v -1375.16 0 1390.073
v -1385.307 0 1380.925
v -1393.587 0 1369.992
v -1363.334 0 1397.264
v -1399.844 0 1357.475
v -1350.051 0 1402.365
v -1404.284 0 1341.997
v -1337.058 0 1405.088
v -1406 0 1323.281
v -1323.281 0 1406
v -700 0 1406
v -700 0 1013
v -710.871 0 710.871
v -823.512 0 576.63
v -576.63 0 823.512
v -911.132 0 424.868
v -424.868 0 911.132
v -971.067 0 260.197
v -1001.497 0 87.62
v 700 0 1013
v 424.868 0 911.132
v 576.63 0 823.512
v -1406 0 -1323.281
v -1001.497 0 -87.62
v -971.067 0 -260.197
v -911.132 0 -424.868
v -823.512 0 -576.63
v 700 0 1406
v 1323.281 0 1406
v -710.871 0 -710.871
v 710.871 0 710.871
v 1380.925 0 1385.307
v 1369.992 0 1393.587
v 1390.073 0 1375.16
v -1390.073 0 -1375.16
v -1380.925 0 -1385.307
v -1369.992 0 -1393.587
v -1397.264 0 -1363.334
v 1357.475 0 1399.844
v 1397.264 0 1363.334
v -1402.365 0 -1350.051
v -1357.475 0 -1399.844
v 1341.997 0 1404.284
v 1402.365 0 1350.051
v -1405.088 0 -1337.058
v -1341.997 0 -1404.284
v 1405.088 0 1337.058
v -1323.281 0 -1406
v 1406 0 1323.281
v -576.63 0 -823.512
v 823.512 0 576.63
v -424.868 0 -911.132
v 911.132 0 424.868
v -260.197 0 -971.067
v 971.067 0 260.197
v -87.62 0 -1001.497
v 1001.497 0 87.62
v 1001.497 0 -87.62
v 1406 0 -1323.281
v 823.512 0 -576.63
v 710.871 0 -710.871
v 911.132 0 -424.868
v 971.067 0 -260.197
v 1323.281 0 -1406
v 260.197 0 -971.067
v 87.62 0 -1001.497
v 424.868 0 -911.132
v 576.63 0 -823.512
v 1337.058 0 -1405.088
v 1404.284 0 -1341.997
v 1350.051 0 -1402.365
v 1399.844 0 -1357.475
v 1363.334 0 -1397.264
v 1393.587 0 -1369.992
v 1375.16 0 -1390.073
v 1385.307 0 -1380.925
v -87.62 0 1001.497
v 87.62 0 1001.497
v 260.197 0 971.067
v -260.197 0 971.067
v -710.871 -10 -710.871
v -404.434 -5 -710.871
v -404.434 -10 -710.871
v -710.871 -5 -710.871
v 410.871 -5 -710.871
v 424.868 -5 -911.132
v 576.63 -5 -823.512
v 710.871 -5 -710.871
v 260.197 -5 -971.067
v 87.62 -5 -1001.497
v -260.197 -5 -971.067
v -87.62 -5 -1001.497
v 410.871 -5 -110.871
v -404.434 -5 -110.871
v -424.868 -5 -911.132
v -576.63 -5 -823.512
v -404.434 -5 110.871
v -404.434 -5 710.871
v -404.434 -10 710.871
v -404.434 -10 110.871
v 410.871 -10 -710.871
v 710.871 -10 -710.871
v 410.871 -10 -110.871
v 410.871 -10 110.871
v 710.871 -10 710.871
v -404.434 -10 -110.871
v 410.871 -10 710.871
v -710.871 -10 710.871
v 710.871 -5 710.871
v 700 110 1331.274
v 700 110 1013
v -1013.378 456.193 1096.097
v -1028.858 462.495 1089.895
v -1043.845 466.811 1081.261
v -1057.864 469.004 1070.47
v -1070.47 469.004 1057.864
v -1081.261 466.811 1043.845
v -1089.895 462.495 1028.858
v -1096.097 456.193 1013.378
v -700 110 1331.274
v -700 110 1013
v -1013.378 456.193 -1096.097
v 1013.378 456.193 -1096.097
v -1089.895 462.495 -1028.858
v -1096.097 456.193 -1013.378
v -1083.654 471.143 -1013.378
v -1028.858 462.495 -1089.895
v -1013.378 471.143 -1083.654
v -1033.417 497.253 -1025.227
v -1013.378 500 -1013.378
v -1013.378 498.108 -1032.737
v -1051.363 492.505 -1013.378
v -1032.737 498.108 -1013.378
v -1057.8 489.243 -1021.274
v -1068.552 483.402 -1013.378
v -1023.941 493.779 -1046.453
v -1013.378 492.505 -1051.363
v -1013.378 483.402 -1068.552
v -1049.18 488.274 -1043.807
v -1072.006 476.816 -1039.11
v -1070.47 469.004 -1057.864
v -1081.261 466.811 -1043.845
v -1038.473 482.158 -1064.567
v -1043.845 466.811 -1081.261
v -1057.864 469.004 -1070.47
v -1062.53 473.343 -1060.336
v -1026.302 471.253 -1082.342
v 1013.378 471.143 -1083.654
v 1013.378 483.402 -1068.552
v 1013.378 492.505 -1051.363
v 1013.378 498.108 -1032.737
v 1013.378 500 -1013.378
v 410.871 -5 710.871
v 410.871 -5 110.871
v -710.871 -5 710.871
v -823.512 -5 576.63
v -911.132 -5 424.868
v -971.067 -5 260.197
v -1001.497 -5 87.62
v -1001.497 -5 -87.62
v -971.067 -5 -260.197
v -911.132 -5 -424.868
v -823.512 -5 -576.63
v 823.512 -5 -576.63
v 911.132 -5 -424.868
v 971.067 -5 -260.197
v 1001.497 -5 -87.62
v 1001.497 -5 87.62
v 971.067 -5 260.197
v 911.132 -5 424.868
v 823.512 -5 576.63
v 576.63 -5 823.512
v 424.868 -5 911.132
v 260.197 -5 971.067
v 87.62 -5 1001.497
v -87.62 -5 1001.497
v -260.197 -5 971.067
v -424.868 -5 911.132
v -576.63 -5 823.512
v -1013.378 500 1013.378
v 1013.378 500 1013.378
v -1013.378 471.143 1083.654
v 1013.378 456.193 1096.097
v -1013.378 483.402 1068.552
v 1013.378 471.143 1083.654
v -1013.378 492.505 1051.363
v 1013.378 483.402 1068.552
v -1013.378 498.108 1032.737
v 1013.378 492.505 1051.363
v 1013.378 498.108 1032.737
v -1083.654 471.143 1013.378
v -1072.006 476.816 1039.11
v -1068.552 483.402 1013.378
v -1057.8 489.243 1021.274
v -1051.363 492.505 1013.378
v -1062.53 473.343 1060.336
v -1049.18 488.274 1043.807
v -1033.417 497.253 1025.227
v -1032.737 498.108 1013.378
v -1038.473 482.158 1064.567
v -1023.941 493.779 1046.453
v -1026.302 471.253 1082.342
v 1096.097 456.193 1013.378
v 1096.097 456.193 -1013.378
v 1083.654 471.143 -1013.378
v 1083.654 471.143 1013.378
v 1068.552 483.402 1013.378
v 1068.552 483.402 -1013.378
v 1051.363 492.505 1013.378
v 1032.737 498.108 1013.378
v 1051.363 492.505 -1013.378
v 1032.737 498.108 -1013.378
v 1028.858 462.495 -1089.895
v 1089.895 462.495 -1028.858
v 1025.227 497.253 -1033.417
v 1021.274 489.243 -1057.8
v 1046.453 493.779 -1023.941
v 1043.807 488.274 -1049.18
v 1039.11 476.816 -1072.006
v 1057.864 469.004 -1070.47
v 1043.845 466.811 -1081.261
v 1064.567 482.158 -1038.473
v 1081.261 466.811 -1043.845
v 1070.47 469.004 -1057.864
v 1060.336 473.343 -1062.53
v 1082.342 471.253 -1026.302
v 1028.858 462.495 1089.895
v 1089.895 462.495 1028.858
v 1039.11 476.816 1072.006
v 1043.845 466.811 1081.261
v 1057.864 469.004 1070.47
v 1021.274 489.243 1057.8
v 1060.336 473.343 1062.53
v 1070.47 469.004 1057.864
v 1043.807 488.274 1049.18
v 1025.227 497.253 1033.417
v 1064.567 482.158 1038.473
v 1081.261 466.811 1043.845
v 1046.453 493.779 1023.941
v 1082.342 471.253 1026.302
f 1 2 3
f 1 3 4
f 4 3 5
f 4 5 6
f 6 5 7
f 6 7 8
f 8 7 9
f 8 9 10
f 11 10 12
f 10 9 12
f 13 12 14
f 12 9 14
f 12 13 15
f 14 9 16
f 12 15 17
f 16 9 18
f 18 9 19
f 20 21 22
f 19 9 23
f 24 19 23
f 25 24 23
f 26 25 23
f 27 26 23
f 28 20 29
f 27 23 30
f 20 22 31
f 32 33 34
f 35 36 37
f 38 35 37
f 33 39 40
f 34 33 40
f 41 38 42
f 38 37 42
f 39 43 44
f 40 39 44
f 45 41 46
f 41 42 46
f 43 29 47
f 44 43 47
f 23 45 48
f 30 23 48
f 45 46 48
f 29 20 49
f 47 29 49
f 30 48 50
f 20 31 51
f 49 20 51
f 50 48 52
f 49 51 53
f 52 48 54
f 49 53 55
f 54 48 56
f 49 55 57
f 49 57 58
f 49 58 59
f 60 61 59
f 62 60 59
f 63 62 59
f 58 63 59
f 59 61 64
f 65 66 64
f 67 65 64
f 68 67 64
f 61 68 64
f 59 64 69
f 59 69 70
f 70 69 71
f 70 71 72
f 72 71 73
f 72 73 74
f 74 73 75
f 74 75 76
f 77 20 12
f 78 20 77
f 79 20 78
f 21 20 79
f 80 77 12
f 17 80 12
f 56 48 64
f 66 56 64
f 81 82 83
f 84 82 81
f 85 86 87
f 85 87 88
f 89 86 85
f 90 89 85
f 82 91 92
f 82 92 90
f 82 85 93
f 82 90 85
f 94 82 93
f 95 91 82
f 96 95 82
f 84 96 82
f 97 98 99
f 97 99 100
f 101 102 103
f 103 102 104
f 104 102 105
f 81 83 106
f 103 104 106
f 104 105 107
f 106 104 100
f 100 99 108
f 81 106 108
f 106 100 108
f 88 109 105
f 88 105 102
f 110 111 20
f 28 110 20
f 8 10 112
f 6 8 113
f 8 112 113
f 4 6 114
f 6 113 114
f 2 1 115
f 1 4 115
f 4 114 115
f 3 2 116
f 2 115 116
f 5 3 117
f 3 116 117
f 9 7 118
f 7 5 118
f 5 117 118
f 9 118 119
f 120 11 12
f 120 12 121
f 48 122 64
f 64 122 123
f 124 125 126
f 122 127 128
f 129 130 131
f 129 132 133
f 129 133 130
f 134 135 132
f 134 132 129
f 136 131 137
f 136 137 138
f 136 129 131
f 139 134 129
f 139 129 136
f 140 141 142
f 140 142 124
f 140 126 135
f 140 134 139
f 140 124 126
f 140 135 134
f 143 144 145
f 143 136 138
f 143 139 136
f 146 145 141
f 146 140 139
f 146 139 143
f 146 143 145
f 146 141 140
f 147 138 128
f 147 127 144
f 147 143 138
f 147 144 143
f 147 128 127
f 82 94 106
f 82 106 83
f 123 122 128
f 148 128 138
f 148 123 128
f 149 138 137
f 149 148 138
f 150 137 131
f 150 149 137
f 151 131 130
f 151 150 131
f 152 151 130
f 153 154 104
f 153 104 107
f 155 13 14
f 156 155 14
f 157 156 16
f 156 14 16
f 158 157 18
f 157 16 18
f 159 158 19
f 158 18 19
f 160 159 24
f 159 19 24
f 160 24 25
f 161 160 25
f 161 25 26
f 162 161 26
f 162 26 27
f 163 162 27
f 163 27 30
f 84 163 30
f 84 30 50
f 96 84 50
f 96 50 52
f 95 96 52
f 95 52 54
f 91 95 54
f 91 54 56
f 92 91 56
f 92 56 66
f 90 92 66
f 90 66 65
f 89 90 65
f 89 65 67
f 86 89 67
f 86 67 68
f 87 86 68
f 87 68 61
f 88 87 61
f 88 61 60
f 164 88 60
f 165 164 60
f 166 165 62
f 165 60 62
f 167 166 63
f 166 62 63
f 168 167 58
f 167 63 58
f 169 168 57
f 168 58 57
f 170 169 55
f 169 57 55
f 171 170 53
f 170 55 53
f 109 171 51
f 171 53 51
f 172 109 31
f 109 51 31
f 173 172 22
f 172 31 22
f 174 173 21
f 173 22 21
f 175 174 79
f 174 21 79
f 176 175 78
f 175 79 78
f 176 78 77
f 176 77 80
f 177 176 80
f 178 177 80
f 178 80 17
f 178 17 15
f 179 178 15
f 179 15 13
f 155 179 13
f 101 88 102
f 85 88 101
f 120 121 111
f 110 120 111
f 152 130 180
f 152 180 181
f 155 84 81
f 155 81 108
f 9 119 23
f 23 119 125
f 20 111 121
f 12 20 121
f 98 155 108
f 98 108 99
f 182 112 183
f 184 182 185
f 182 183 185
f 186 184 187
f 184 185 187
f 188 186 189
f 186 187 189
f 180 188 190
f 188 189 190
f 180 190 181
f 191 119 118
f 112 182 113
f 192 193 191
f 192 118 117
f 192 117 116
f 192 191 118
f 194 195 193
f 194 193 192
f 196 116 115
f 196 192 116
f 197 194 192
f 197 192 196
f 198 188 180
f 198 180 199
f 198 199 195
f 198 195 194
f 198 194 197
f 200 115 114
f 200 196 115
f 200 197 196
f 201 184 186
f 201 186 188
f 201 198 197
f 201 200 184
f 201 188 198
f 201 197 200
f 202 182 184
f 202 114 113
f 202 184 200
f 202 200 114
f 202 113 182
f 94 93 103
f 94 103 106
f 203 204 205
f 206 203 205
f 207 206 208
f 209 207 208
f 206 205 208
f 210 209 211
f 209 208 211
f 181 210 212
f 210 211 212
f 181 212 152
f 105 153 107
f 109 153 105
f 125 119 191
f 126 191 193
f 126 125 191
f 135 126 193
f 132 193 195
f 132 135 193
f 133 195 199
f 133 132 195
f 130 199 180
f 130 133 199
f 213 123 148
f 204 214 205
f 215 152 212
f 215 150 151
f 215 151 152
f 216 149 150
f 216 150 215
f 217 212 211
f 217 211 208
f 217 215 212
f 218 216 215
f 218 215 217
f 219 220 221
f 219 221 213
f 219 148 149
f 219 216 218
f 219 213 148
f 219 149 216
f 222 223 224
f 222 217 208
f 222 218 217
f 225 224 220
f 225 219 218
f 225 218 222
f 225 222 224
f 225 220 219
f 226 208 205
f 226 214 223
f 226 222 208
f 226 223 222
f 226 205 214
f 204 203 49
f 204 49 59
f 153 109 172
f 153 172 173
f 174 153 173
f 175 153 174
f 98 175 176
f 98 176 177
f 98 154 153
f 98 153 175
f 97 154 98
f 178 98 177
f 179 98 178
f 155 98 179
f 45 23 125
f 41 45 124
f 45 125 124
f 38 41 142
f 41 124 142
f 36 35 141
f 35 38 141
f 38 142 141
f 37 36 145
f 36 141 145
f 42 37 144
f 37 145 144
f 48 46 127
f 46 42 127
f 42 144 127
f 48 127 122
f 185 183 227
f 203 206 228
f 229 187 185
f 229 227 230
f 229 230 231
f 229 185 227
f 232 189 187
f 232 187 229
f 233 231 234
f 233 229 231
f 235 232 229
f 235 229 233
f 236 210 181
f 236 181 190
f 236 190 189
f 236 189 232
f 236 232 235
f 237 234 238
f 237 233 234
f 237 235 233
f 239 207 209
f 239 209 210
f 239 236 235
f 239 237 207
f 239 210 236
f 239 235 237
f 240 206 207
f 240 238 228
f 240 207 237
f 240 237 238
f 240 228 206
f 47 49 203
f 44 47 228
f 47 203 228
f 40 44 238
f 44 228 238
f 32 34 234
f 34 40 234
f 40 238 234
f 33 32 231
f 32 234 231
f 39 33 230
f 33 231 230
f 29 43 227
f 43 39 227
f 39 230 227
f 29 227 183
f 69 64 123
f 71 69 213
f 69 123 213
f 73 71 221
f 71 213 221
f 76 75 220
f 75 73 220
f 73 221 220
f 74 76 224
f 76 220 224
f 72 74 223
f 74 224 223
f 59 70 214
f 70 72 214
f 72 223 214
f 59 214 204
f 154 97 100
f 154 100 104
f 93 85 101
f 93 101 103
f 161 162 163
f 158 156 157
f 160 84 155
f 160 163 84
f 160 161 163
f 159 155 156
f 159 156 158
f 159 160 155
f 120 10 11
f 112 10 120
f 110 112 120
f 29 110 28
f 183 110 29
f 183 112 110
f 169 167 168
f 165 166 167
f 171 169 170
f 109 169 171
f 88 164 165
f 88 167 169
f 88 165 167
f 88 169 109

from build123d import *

# Parameters (mm, degrees)
LOFT1_OUTLINE_W     = 2132.6753346
LOFT1_OUTLINE_H     = 2132.6753346
LOFT1_DEPTH         = 500
LOFT1_DRAFT         = 34.1892347
FILLET1_R           = 100
FILLET2_R           = 100
CUT_EXTRUDE1_DEPTH  = 500
BOSS_EXTRUDE3_DEPTH = 10
SKETCH6_R           = 1005.3229303305633
BOSS_EXTRUDE4_DEPTH = 5


with BuildPart() as part:
    # Loft1: read off the stored shape, not the designer's step
    # Loft1 outline → Loft1 (with draft: the straight prism first)
    with BuildSketch(Plane(origin=(0, 500, 0), x_dir=(1, 0, 0), z_dir=(0, 1, 0))):
        Rectangle(LOFT1_OUTLINE_W, LOFT1_OUTLINE_H)
    extrude(amount=-LOFT1_DEPTH)
    # Loft1: the draft: its side faces are tilted about the plane it starts from
    loft1_sides = [part.faces().sort_by_distance(p)[0] for p in [
        (1066.3376673, 250, 0),
        (0, 250, -1066.3376673),
        (-1066.3376673, 250, 0),
        (0, 250, 1066.3376673),
    ]]
    draft(loft1_sides, Plane(origin=(0, 500, 0), x_dir=(1, 0, 0), z_dir=(0, 1, 0)), LOFT1_DRAFT)

    # Fillet1
    fillet1_edges = [part.edges().sort_by_distance(p)[0] for p in [
        (0, 500, -1066.3376673),
        (-1066.3376673, 500, 0),
        (0, 500, 1066.3376673),
        (1066.3376673, 500, 0),
    ]]
    fillet(fillet1_edges, radius=FILLET1_R)

    # Fillet2
    # the kernel refuses this fillet: 100 mm, written as the material it takes off along each edge
    with BuildSketch(Plane(origin=(-1013.3783640207519, 400, 1013.3783640207519), x_dir=(0.8421817639825007, 0.4460135945500142, -0.3029880358890411), z_dir=(-0.3411479339355868, 0.8759201871991312, 0.3411479339355868))) as fillet2_piece_1_section:
        Polygon((-149.92498415878302, -149.92498415878302), (149.92498415878302, -149.92498415878302), (149.92498415878302, 149.92498415878302), (-149.92498415878302, 149.92498415878302), align=None)
    fillet2_piece_1 = extrude(amount=149.92498415878302, mode=Mode.PRIVATE)
    fillet2_piece_1 = split(fillet2_piece_1, bisect_by=Plane(origin=(-1013.3783640207519, 400, 1013.3783640207519), z_dir=(0.4898823656610836, 0.7211314274309507, -0.4898823656610836)), keep=Keep.TOP, mode=Mode.PRIVATE)
    fillet2_piece_1 = split(fillet2_piece_1, bisect_by=Plane(origin=(-1013.3783640207519, 400, 1013.3783640207519), z_dir=(0, 0, 1)), keep=Keep.TOP, mode=Mode.PRIVATE)
    fillet2_piece_1 = split(fillet2_piece_1, bisect_by=Plane(origin=(-1013.3783640207519, 400, 1013.3783640207519), z_dir=(-1, 0, 0)), keep=Keep.TOP, mode=Mode.PRIVATE)
    fillet2_piece_1 = split(fillet2_piece_1, bisect_by=Plane(origin=(-1013.3783640207519, 456.19279678203594, 1096.09698096889), z_dir=(0, -0.5619279678203596, -0.8271861694813816)), keep=Keep.TOP, mode=Mode.PRIVATE)
    fillet2_piece_1 = split(fillet2_piece_1, bisect_by=Plane(origin=(-1096.09698096889, 456.19279678203594, 1013.3783640207519), z_dir=(0.8271861694813816, -0.5619279678203596, 0)), keep=Keep.TOP, mode=Mode.PRIVATE)
    fillet2_piece_1 = split(fillet2_piece_1, bisect_by=Plane(origin=(-1013.3783640207519, 500, 1013.3783640207519), z_dir=(0, -1, 0)), keep=Keep.TOP, mode=Mode.PRIVATE)
    fillet2_piece_1 = fillet2_piece_1 - Plane(origin=(-1013.3783640207519, 400, 1013.3783640207519), x_dir=(0.3411479339355868, -0.8759201871991312, -0.3411479339355868), z_dir=(0.8421817639825007, 0.4460135945500142, -0.3029880358890411)) * Sphere(FILLET2_R, mode=Mode.PRIVATE)
    with BuildSketch(Plane(origin=(1013.3783640207519, 400, 1013.3783640207519), x_dir=(-0.30298803588904116, 0.44601359455001427, -0.8421817639825008), z_dir=(0.3411479339355868, 0.8759201871991312, 0.3411479339355868))) as fillet2_piece_2_section:
        Polygon((-149.92498415878302, -149.92498415878302), (149.92498415878302, -149.92498415878302), (149.92498415878302, 149.92498415878302), (-149.92498415878302, 149.92498415878302), align=None)
    fillet2_piece_2 = extrude(amount=149.92498415878302, mode=Mode.PRIVATE)
    fillet2_piece_2 = split(fillet2_piece_2, bisect_by=Plane(origin=(1013.3783640207519, 400, 1013.3783640207519), z_dir=(-0.4898823656610836, 0.7211314274309507, -0.4898823656610836)), keep=Keep.TOP, mode=Mode.PRIVATE)
    fillet2_piece_2 = split(fillet2_piece_2, bisect_by=Plane(origin=(1013.3783640207519, 400, 1013.3783640207519), z_dir=(1, 0, 0)), keep=Keep.TOP, mode=Mode.PRIVATE)
    fillet2_piece_2 = split(fillet2_piece_2, bisect_by=Plane(origin=(1013.3783640207519, 400, 1013.3783640207519), z_dir=(0, 0, 1)), keep=Keep.TOP, mode=Mode.PRIVATE)
    fillet2_piece_2 = split(fillet2_piece_2, bisect_by=Plane(origin=(1096.09698096889, 456.19279678203594, 1013.3783640207519), z_dir=(-0.8271861694813816, -0.5619279678203596, 0)), keep=Keep.TOP, mode=Mode.PRIVATE)
    fillet2_piece_2 = split(fillet2_piece_2, bisect_by=Plane(origin=(1013.3783640207519, 456.19279678203594, 1096.09698096889), z_dir=(0, -0.5619279678203596, -0.8271861694813816)), keep=Keep.TOP, mode=Mode.PRIVATE)
    fillet2_piece_2 = split(fillet2_piece_2, bisect_by=Plane(origin=(1013.3783640207519, 500, 1013.3783640207519), z_dir=(0, -1, 0)), keep=Keep.TOP, mode=Mode.PRIVATE)
    fillet2_piece_2 = fillet2_piece_2 - Plane(origin=(1013.3783640207519, 400, 1013.3783640207519), x_dir=(-0.3411479339355868, -0.8759201871991312, -0.3411479339355868), z_dir=(-0.30298803588904116, 0.44601359455001427, -0.8421817639825008)) * Sphere(FILLET2_R, mode=Mode.PRIVATE)
    with BuildSketch(Plane(origin=(1013.3783640207519, 400, -1013.3783640207519), x_dir=(0.30298803588904116, -0.44601359455001427, -0.8421817639825008), z_dir=(0.3411479339355868, 0.8759201871991312, -0.3411479339355868))) as fillet2_piece_3_section:
        Polygon((-149.92498415878302, -149.92498415878302), (149.92498415878302, -149.92498415878302), (149.92498415878302, 149.92498415878302), (-149.92498415878302, 149.92498415878302), align=None)
    fillet2_piece_3 = extrude(amount=149.92498415878302, mode=Mode.PRIVATE)
    fillet2_piece_3 = split(fillet2_piece_3, bisect_by=Plane(origin=(1013.3783640207519, 400, -1013.3783640207519), z_dir=(-0.4898823656610836, 0.7211314274309507, 0.4898823656610836)), keep=Keep.TOP, mode=Mode.PRIVATE)
    fillet2_piece_3 = split(fillet2_piece_3, bisect_by=Plane(origin=(1013.3783640207519, 400, -1013.3783640207519), z_dir=(1, 0, 0)), keep=Keep.TOP, mode=Mode.PRIVATE)
    fillet2_piece_3 = split(fillet2_piece_3, bisect_by=Plane(origin=(1013.3783640207519, 400, -1013.3783640207519), z_dir=(0, 0, -1)), keep=Keep.TOP, mode=Mode.PRIVATE)
    fillet2_piece_3 = split(fillet2_piece_3, bisect_by=Plane(origin=(1096.09698096889, 456.19279678203594, -1013.3783640207519), z_dir=(-0.8271861694813816, -0.5619279678203596, 0)), keep=Keep.TOP, mode=Mode.PRIVATE)
    fillet2_piece_3 = split(fillet2_piece_3, bisect_by=Plane(origin=(1013.3783640207519, 456.19279678203594, -1096.09698096889), z_dir=(0, -0.5619279678203596, 0.8271861694813816)), keep=Keep.TOP, mode=Mode.PRIVATE)
    fillet2_piece_3 = split(fillet2_piece_3, bisect_by=Plane(origin=(1013.3783640207519, 500, -1013.3783640207519), z_dir=(0, -1, 0)), keep=Keep.TOP, mode=Mode.PRIVATE)
    fillet2_piece_3 = fillet2_piece_3 - Plane(origin=(1013.3783640207519, 400, -1013.3783640207519), x_dir=(-0.3411479339355868, -0.8759201871991312, 0.3411479339355868), z_dir=(0.30298803588904116, -0.44601359455001427, -0.8421817639825008)) * Sphere(FILLET2_R, mode=Mode.PRIVATE)
    with BuildSketch(Plane(origin=(-1013.3783640207519, 400, -1013.3783640207519), x_dir=(-0.8421817639825007, -0.4460135945500142, -0.3029880358890411), z_dir=(-0.3411479339355868, 0.8759201871991312, -0.3411479339355868))) as fillet2_piece_4_section:
        Polygon((-149.92498415878302, -149.92498415878302), (149.92498415878302, -149.92498415878302), (149.92498415878302, 149.92498415878302), (-149.92498415878302, 149.92498415878302), align=None)
    fillet2_piece_4 = extrude(amount=149.92498415878302, mode=Mode.PRIVATE)
    fillet2_piece_4 = split(fillet2_piece_4, bisect_by=Plane(origin=(-1013.3783640207519, 400, -1013.3783640207519), z_dir=(0.4898823656610836, 0.7211314274309507, 0.4898823656610836)), keep=Keep.TOP, mode=Mode.PRIVATE)
    fillet2_piece_4 = split(fillet2_piece_4, bisect_by=Plane(origin=(-1013.3783640207519, 400, -1013.3783640207519), z_dir=(0, 0, -1)), keep=Keep.TOP, mode=Mode.PRIVATE)
    fillet2_piece_4 = split(fillet2_piece_4, bisect_by=Plane(origin=(-1013.3783640207519, 400, -1013.3783640207519), z_dir=(-1, 0, 0)), keep=Keep.TOP, mode=Mode.PRIVATE)
    fillet2_piece_4 = split(fillet2_piece_4, bisect_by=Plane(origin=(-1013.3783640207519, 456.19279678203594, -1096.09698096889), z_dir=(0, -0.5619279678203596, 0.8271861694813816)), keep=Keep.TOP, mode=Mode.PRIVATE)
    fillet2_piece_4 = split(fillet2_piece_4, bisect_by=Plane(origin=(-1096.09698096889, 456.19279678203594, -1013.3783640207519), z_dir=(0.8271861694813816, -0.5619279678203596, 0)), keep=Keep.TOP, mode=Mode.PRIVATE)
    fillet2_piece_4 = split(fillet2_piece_4, bisect_by=Plane(origin=(-1013.3783640207519, 500, -1013.3783640207519), z_dir=(0, -1, 0)), keep=Keep.TOP, mode=Mode.PRIVATE)
    fillet2_piece_4 = fillet2_piece_4 - Plane(origin=(-1013.3783640207519, 400, -1013.3783640207519), x_dir=(0.3411479339355868, -0.8759201871991312, 0.3411479339355868), z_dir=(-0.8421817639825007, -0.4460135945500142, -0.3029880358890411)) * Sphere(FILLET2_R, mode=Mode.PRIVATE)
    with BuildSketch(Plane(origin=(-1076.2457758338196, 485.41476699106727, 1076.2457758338196), x_dir=(0.8717885453562122, -0.4052239175476701, 0.27527860220696176), z_dir=(-0.4898823656610837, -0.7211314274309508, 0.4898823656610837))) as fillet2_piece_5:
        with BuildLine():
            CenterArc((FILLET2_R * 0.721131427431, -FILLET2_R), FILLET2_R, 90.00000000000009, 71.5931159786692)
            Line((-FILLET2_R * 0.2277066525, -FILLET2_R * 0.684236958981), (0, 0))
            Line((0, 0), (FILLET2_R * 0.721131427431, -4.86e-15))
        make_face()
    fillet2_piece_5_solid = extrude(amount=853.4122595248351, mode=Mode.PRIVATE)
    with BuildSketch(Plane(origin=(1076.2457758338196, 485.41476699106727, 1076.2457758338196), x_dir=(0.27527860220696176, -0.4052239175476702, -0.8717885453562122), z_dir=(0.4898823656610837, -0.7211314274309508, 0.4898823656610837))) as fillet2_piece_6:
        with BuildLine():
            CenterArc((FILLET2_R * 0.721131427431, -FILLET2_R), FILLET2_R, 90.00000000000009, 71.5931159786692)
            Line((-FILLET2_R * 0.2277066525, -FILLET2_R * 0.684236958981), (0, 0))
            Line((0, 0), (FILLET2_R * 0.721131427431, -1.56e-15))
        make_face()
    fillet2_piece_6_solid = extrude(amount=853.4122595248351, mode=Mode.PRIVATE)
    with BuildSketch(Plane(origin=(1076.2457758338196, 485.41476699106727, -1076.2457758338196), x_dir=(0.27527860220696176, -0.4052239175476702, 0.8717885453562122), z_dir=(0.4898823656610837, -0.7211314274309508, -0.4898823656610837))) as fillet2_piece_7:
        with BuildLine():
            CenterArc((FILLET2_R * 0.721131427431, FILLET2_R), FILLET2_R, 198.4068840213307, 71.59311597866918)
            Line((-FILLET2_R * 0.2277066525, FILLET2_R * 0.684236958981), (0, 0))
            Line((0, 0), (FILLET2_R * 0.721131427431, 1.56e-15))
        make_face()
    fillet2_piece_7_solid = extrude(amount=853.4122595248351, mode=Mode.PRIVATE)
    with BuildSketch(Plane(origin=(-1076.2457758338196, 485.41476699106727, -1076.2457758338196), x_dir=(0.8717885453562122, -0.4052239175476701, -0.27527860220696176), z_dir=(-0.4898823656610837, -0.7211314274309508, -0.4898823656610837))) as fillet2_piece_8:
        with BuildLine():
            CenterArc((FILLET2_R * 0.721131427431, FILLET2_R), FILLET2_R, 198.4068840213307, 71.59311597866918)
            Line((-FILLET2_R * 0.2277066525, FILLET2_R * 0.684236958981), (0, 0))
            Line((0, 0), (FILLET2_R * 0.721131427431, 4.86e-15))
        make_face()
    fillet2_piece_8_solid = extrude(amount=853.4122595248351, mode=Mode.PRIVATE)
    add([fillet2_piece_1, fillet2_piece_2, fillet2_piece_3, fillet2_piece_4, fillet2_piece_5_solid, fillet2_piece_6_solid, fillet2_piece_7_solid, fillet2_piece_8_solid], mode=Mode.SUBTRACT)

    # Sketch4 → Cut-Extrude1 (cut)
    with BuildSketch(Plane.XY.offset(1012.9999999999999)):
        Polygon((700, -109.9999999999999), (-700, -110.00000000000009), (-700, 109.99999999999994), (700, 110.0000000000001), align=None)
    extrude(amount=CUT_EXTRUDE1_DEPTH, mode=Mode.SUBTRACT)

    # Sketch5 → Boss-Extrude3 (add)
    with BuildSketch(Plane.XZ):
        Polygon((-710.8706613190724, 710.8706613190723), (-404.4340828727684, 710.8706613190723), (-404.4340828727684, 110.87066131907231), (410.87066131907216, 110.87066131907231), (410.87066131907216, 710.8706613190723), (710.8706613190722, 710.8706613190723), (710.8706613190724, -710.8706613190723), (410.87066131907216, -710.8706613190723), (410.87066131907216, -110.87066131907231), (-404.4340828727684, -110.87066131907231), (-404.4340828727684, -710.8706613190723), (-710.8706613190722, -710.8706613190723), align=None)
    extrude(amount=BOSS_EXTRUDE3_DEPTH)

    # Sketch6 → Boss-Extrude4 (add)
    with BuildSketch(Plane.XZ):
        with Locations(Location((0, 0, 0), (0, 0, 135))):
            Circle(SKETCH6_R)
    extrude(amount=BOSS_EXTRUDE4_DEPTH)


solid = part.part
